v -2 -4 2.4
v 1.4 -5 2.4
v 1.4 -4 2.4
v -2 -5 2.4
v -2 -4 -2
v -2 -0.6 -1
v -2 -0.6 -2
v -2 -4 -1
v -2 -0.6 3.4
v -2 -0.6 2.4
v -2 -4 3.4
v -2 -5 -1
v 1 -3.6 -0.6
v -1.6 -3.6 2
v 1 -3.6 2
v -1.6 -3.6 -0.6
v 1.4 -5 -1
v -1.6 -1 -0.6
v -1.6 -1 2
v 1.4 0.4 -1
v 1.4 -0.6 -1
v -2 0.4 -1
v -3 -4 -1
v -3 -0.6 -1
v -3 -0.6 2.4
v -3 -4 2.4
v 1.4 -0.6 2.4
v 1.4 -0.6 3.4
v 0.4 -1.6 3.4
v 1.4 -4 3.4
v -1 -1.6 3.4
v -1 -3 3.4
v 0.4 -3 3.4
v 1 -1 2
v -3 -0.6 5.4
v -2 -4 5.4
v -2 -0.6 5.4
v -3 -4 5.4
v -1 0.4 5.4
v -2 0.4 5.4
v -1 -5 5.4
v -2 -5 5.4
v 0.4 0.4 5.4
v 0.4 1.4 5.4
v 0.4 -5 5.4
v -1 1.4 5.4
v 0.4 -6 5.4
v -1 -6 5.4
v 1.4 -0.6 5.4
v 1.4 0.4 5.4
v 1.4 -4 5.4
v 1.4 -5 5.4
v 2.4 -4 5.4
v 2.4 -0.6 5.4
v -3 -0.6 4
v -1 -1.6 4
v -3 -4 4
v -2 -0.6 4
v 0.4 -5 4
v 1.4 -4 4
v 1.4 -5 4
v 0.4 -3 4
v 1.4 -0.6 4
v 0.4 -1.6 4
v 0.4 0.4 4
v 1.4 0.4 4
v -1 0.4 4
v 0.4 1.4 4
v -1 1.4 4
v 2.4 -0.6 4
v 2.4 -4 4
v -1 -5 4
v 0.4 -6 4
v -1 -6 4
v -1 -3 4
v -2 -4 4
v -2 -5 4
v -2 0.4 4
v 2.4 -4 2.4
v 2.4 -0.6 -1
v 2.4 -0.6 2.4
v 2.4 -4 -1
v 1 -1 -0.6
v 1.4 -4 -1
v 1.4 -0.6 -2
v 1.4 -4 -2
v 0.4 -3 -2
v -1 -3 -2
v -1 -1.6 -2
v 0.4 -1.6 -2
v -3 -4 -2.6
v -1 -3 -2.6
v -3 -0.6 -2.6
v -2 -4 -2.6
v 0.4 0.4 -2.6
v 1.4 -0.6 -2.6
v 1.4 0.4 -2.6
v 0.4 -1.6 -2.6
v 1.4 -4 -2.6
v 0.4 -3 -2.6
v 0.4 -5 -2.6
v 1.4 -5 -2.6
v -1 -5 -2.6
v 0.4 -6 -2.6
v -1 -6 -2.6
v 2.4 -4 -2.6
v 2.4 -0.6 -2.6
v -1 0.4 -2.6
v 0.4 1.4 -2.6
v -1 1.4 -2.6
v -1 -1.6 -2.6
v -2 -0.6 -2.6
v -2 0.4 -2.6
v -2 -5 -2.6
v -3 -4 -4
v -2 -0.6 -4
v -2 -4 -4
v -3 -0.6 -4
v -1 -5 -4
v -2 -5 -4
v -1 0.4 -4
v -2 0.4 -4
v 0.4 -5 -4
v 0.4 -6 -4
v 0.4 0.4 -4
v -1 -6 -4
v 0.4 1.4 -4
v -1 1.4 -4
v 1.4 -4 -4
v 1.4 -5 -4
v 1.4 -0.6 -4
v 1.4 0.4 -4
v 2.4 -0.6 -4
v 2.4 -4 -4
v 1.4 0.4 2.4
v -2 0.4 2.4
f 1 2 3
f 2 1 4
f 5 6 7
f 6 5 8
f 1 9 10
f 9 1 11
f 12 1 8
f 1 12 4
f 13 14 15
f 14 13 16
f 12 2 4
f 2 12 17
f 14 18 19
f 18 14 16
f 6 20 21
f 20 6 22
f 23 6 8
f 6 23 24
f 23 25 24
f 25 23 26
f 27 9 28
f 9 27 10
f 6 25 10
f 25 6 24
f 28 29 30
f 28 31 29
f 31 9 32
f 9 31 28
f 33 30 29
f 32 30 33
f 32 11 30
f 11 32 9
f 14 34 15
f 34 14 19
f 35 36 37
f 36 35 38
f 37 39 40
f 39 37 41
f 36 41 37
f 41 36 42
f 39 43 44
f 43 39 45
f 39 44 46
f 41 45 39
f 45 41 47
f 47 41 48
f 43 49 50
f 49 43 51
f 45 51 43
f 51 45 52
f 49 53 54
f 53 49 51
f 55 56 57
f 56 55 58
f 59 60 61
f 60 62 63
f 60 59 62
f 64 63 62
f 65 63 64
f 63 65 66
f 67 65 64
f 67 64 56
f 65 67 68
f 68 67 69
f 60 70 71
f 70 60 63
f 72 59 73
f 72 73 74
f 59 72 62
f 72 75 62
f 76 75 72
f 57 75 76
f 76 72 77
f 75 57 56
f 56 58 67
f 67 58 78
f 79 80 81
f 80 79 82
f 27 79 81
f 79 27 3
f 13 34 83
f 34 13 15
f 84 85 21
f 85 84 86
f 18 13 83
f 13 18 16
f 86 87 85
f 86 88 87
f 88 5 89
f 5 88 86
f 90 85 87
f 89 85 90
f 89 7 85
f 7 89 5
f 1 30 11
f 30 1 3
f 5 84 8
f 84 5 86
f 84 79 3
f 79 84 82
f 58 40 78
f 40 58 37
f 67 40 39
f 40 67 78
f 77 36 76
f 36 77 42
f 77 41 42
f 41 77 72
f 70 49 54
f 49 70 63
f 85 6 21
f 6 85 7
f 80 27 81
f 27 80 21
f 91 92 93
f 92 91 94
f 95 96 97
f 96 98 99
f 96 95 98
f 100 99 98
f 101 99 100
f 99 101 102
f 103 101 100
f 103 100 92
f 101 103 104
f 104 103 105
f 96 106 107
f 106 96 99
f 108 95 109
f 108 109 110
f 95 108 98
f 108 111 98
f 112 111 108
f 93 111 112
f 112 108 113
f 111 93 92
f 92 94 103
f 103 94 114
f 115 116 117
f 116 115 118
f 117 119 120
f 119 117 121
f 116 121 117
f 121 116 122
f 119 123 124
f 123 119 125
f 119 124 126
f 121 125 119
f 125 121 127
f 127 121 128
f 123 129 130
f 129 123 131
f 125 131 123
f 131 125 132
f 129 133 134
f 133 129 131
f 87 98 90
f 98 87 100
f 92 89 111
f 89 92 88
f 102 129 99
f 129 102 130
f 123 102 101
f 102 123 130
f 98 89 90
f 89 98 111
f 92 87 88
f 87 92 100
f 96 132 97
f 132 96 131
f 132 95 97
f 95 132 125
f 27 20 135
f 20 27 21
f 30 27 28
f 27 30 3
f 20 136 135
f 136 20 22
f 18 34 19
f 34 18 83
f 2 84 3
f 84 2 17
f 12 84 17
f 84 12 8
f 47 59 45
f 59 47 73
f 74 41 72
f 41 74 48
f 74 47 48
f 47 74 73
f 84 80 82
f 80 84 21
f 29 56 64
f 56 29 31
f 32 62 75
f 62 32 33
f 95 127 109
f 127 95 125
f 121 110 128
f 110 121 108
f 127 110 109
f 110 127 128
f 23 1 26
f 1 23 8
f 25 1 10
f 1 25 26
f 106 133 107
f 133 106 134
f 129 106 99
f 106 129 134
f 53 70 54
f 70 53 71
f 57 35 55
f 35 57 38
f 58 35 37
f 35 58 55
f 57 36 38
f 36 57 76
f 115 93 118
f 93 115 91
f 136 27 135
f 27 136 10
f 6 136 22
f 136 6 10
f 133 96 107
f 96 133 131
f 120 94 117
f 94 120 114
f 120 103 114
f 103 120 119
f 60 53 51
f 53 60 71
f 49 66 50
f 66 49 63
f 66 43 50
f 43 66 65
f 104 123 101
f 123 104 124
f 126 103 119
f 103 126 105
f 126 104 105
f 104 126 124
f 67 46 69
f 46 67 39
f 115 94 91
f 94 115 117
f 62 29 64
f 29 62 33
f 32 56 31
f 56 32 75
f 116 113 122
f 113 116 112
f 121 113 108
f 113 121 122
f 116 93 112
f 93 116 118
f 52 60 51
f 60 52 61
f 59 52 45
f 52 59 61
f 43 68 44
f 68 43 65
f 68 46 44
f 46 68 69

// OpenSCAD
blockScale = 1;
sideOverlap = 0.2;
sideLength = blockScale * (1+2*sideOverlap);

blockScale = 1;
sideOverlap = 0.2;
sideLength = blockScale * (1+2*sideOverlap);            
module block(x,y,z,r,g,b,a) {
    color([r,g,b,a]) translate([x*blockScale,y*blockScale,z*blockScale]) cube(sideLength);
}
module object() {
block(-2,-5,1,0.250980,0.250980,0.250980,1.000000);
block(-3,-2,-1,0.250980,0.250980,0.250980,1.000000);
block(-1,-3,2,0.250980,0.250980,0.250980,1.000000);
block(-1,-5,1,0.250980,0.250980,0.250980,1.000000);
block(-2,-2,4,0.250980,0.250980,0.250980,1.000000);
block(1,-3,1,0.098039,0.098039,0.098039,0.250980);
block(0,-4,-2,0.250980,0.250980,0.250980,1.000000);
block(-2,-3,-2,0.250980,0.250980,0.250980,1.000000);
block(-2,-1,4,0.250980,0.250980,0.250980,1.000000);
block(1,-3,0,0.098039,0.098039,0.098039,0.250980);
block(-2,-5,4,0.250980,0.250980,0.250980,1.000000);
block(0,-2,4,0.250980,0.250980,0.250980,1.000000);
block(0,-2,-2,0.250980,0.250980,0.250980,1.000000);
block(-2,-3,-4,0.250980,0.250980,0.250980,1.000000);
block(-1,-4,4,0.250980,0.250980,0.250980,1.000000);
block(-1,-1,-4,0.250980,0.250980,0.250980,1.000000);
block(0,-5,-4,0.250980,0.250980,0.250980,1.000000);
block(-1,-3,-3,0.250980,0.250980,0.250980,1.000000);
block(-1,-3,-2,0.250980,0.250980,0.250980,1.000000);
block(0,-1,-4,0.250980,0.250980,0.250980,1.000000);
block(0,-1,-1,0.250980,0.250980,0.250980,1.000000);
block(0,-5,-1,0.250980,0.250980,0.250980,1.000000);
block(-1,-6,4,0.250980,0.250980,0.250980,1.000000);
block(1,-4,-1,0.250980,0.250980,0.250980,1.000000);
block(0,-3,2,0.250980,0.250980,0.250980,1.000000);
block(-1,0,-4,0.250980,0.250980,0.250980,1.000000);
block(-2,-2,-4,0.250980,0.250980,0.250980,1.000000);
block(-3,-4,0,0.250980,0.250980,0.250980,1.000000);
block(-1,-2,4,0.250980,0.250980,0.250980,1.000000);
block(-3,-4,1,0.250980,0.250980,0.250980,1.000000);
block(1,-4,-4,0.250980,0.250980,0.250980,1.000000);
block(-1,-4,2,0.250980,0.250980,0.250980,1.000000);
block(-2,-5,0,0.250980,0.250980,0.250980,1.000000);
block(1,-2,4,0.250980,0.250980,0.250980,1.000000);
block(-3,-2,4,0.250980,0.250980,0.250980,1.000000);
block(-1,-4,-4,0.250980,0.250980,0.250980,1.000000);
block(-3,-4,4,0.250980,0.250980,0.250980,1.000000);
block(-3,-3,-4,0.250980,0.250980,0.250980,1.000000);
block(1,-3,-4,0.250980,0.250980,0.250980,1.000000);
block(0,-3,4,0.250980,0.250980,0.250980,1.000000);
block(1,-2,0,0.098039,0.098039,0.098039,0.250980);
block(-2,-2,-2,0.250980,0.250980,0.250980,1.000000);
block(-2,-1,1,0.250980,0.250980,0.250980,1.000000);
block(-2,-4,2,0.250980,0.250980,0.250980,1.000000);
block(1,-2,1,0.098039,0.098039,0.098039,0.250980);
block(0,-4,2,0.250980,0.250980,0.250980,1.000000);
block(1,-2,-4,0.250980,0.250980,0.250980,1.000000);
block(-1,-2,-2,0.250980,0.250980,0.250980,1.000000);
block(-2,-1,-1,0.250980,0.250980,0.250980,1.000000);
block(-3,-3,-1,0.250980,0.250980,0.250980,1.000000);
block(0,-3,-2,0.250980,0.250980,0.250980,1.000000);
block(-1,-5,4,0.250980,0.250980,0.250980,1.000000);
block(1,-2,-1,0.098039,0.098039,0.098039,0.250980);
block(0,-4,-4,0.250980,0.250980,0.250980,1.000000);
block(-1,-1,-1,0.250980,0.250980,0.250980,1.000000);
block(-3,-3,1,0.250980,0.250980,0.250980,1.000000);
block(-2,-5,-4,0.250980,0.250980,0.250980,1.000000);
block(-3,-3,0,0.250980,0.250980,0.250980,1.000000);
block(1,-3,-1,0.098039,0.098039,0.098039,0.250980);
block(-2,-4,4,0.250980,0.250980,0.250980,1.000000);
block(1,-4,4,0.250980,0.250980,0.250980,1.000000);
block(-2,-1,0,0.250980,0.250980,0.250980,1.000000);
block(0,-4,4,0.250980,0.250980,0.250980,1.000000);
block(-2,-4,-4,0.250980,0.250980,0.250980,1.000000);
block(-1,-4,-2,0.250980,0.250980,0.250980,1.000000);
block(-2,-2,2,0.250980,0.250980,0.250980,1.000000);
block(-1,-5,-1,0.250980,0.250980,0.250980,1.000000);
block(-2,-3,4,0.250980,0.250980,0.250980,1.000000);
block(-3,-3,4,0.250980,0.250980,0.250980,1.000000);
block(-3,-4,-1,0.250980,0.250980,0.250980,1.000000);
block(0,-1,4,0.250980,0.250980,0.250980,1.000000);
block(0,-3,-4,0.250980,0.250980,0.250980,1.000000);
block(1,-4,0,0.250980,0.250980,0.250980,1.000000);
block(-1,-6,-4,0.250980,0.250980,0.250980,1.000000);
block(-1,-1,4,0.250980,0.250980,0.250980,1.000000);
block(-1,-3,-4,0.250980,0.250980,0.250980,1.000000);
block(1,-4,1,0.250980,0.250980,0.250980,1.000000);
block(-3,-4,-4,0.250980,0.250980,0.250980,1.000000);
block(0,-2,-4,0.250980,0.250980,0.250980,1.000000);
block(-1,-3,4,0.250980,0.250980,0.250980,1.000000);
block(0,-1,1,0.250980,0.250980,0.250980,1.000000);
block(-1,-2,-4,0.250980,0.250980,0.250980,1.000000);
block(0,-1,0,0.250980,0.250980,0.250980,1.000000);
block(-2,-3,2,0.250980,0.250980,0.250980,1.000000);
block(-3,-2,1,0.250980,0.250980,0.250980,1.000000);
block(-1,-3,3,0.250980,0.250980,0.250980,1.000000);
block(-2,-4,-2,0.250980,0.250980,0.250980,1.000000);
block(0,-5,0,0.250980,0.250980,0.250980,1.000000);
block(-1,-2,2,0.250980,0.250980,0.250980,1.000000);
block(0,-2,2,0.250980,0.250980,0.250980,1.000000);
block(-2,-1,-4,0.250980,0.250980,0.250980,1.000000);
block(0,-5,1,0.250980,0.250980,0.250980,1.000000);
block(-1,-1,1,0.250980,0.250980,0.250980,1.000000);
block(-2,-5,-1,0.250980,0.250980,0.250980,1.000000);
block(-1,-5,-4,0.250980,0.250980,0.250980,1.000000);
block(-1,-1,0,0.250980,0.250980,0.250980,1.000000);
block(-3,-2,0,0.250980,0.250980,0.250980,1.000000);
block(-3,-2,-4,0.250980,0.250980,0.250980,1.000000);
block(1,-3,4,0.250980,0.250980,0.250980,1.000000);
block(-1,-5,0,0.250980,0.250980,0.250980,1.000000);
block(0,-5,4,0.250980,0.250980,0.250980,1.000000);
block(-1,0,4,0.250980,0.250980,0.250980,1.000000);
}
object();
